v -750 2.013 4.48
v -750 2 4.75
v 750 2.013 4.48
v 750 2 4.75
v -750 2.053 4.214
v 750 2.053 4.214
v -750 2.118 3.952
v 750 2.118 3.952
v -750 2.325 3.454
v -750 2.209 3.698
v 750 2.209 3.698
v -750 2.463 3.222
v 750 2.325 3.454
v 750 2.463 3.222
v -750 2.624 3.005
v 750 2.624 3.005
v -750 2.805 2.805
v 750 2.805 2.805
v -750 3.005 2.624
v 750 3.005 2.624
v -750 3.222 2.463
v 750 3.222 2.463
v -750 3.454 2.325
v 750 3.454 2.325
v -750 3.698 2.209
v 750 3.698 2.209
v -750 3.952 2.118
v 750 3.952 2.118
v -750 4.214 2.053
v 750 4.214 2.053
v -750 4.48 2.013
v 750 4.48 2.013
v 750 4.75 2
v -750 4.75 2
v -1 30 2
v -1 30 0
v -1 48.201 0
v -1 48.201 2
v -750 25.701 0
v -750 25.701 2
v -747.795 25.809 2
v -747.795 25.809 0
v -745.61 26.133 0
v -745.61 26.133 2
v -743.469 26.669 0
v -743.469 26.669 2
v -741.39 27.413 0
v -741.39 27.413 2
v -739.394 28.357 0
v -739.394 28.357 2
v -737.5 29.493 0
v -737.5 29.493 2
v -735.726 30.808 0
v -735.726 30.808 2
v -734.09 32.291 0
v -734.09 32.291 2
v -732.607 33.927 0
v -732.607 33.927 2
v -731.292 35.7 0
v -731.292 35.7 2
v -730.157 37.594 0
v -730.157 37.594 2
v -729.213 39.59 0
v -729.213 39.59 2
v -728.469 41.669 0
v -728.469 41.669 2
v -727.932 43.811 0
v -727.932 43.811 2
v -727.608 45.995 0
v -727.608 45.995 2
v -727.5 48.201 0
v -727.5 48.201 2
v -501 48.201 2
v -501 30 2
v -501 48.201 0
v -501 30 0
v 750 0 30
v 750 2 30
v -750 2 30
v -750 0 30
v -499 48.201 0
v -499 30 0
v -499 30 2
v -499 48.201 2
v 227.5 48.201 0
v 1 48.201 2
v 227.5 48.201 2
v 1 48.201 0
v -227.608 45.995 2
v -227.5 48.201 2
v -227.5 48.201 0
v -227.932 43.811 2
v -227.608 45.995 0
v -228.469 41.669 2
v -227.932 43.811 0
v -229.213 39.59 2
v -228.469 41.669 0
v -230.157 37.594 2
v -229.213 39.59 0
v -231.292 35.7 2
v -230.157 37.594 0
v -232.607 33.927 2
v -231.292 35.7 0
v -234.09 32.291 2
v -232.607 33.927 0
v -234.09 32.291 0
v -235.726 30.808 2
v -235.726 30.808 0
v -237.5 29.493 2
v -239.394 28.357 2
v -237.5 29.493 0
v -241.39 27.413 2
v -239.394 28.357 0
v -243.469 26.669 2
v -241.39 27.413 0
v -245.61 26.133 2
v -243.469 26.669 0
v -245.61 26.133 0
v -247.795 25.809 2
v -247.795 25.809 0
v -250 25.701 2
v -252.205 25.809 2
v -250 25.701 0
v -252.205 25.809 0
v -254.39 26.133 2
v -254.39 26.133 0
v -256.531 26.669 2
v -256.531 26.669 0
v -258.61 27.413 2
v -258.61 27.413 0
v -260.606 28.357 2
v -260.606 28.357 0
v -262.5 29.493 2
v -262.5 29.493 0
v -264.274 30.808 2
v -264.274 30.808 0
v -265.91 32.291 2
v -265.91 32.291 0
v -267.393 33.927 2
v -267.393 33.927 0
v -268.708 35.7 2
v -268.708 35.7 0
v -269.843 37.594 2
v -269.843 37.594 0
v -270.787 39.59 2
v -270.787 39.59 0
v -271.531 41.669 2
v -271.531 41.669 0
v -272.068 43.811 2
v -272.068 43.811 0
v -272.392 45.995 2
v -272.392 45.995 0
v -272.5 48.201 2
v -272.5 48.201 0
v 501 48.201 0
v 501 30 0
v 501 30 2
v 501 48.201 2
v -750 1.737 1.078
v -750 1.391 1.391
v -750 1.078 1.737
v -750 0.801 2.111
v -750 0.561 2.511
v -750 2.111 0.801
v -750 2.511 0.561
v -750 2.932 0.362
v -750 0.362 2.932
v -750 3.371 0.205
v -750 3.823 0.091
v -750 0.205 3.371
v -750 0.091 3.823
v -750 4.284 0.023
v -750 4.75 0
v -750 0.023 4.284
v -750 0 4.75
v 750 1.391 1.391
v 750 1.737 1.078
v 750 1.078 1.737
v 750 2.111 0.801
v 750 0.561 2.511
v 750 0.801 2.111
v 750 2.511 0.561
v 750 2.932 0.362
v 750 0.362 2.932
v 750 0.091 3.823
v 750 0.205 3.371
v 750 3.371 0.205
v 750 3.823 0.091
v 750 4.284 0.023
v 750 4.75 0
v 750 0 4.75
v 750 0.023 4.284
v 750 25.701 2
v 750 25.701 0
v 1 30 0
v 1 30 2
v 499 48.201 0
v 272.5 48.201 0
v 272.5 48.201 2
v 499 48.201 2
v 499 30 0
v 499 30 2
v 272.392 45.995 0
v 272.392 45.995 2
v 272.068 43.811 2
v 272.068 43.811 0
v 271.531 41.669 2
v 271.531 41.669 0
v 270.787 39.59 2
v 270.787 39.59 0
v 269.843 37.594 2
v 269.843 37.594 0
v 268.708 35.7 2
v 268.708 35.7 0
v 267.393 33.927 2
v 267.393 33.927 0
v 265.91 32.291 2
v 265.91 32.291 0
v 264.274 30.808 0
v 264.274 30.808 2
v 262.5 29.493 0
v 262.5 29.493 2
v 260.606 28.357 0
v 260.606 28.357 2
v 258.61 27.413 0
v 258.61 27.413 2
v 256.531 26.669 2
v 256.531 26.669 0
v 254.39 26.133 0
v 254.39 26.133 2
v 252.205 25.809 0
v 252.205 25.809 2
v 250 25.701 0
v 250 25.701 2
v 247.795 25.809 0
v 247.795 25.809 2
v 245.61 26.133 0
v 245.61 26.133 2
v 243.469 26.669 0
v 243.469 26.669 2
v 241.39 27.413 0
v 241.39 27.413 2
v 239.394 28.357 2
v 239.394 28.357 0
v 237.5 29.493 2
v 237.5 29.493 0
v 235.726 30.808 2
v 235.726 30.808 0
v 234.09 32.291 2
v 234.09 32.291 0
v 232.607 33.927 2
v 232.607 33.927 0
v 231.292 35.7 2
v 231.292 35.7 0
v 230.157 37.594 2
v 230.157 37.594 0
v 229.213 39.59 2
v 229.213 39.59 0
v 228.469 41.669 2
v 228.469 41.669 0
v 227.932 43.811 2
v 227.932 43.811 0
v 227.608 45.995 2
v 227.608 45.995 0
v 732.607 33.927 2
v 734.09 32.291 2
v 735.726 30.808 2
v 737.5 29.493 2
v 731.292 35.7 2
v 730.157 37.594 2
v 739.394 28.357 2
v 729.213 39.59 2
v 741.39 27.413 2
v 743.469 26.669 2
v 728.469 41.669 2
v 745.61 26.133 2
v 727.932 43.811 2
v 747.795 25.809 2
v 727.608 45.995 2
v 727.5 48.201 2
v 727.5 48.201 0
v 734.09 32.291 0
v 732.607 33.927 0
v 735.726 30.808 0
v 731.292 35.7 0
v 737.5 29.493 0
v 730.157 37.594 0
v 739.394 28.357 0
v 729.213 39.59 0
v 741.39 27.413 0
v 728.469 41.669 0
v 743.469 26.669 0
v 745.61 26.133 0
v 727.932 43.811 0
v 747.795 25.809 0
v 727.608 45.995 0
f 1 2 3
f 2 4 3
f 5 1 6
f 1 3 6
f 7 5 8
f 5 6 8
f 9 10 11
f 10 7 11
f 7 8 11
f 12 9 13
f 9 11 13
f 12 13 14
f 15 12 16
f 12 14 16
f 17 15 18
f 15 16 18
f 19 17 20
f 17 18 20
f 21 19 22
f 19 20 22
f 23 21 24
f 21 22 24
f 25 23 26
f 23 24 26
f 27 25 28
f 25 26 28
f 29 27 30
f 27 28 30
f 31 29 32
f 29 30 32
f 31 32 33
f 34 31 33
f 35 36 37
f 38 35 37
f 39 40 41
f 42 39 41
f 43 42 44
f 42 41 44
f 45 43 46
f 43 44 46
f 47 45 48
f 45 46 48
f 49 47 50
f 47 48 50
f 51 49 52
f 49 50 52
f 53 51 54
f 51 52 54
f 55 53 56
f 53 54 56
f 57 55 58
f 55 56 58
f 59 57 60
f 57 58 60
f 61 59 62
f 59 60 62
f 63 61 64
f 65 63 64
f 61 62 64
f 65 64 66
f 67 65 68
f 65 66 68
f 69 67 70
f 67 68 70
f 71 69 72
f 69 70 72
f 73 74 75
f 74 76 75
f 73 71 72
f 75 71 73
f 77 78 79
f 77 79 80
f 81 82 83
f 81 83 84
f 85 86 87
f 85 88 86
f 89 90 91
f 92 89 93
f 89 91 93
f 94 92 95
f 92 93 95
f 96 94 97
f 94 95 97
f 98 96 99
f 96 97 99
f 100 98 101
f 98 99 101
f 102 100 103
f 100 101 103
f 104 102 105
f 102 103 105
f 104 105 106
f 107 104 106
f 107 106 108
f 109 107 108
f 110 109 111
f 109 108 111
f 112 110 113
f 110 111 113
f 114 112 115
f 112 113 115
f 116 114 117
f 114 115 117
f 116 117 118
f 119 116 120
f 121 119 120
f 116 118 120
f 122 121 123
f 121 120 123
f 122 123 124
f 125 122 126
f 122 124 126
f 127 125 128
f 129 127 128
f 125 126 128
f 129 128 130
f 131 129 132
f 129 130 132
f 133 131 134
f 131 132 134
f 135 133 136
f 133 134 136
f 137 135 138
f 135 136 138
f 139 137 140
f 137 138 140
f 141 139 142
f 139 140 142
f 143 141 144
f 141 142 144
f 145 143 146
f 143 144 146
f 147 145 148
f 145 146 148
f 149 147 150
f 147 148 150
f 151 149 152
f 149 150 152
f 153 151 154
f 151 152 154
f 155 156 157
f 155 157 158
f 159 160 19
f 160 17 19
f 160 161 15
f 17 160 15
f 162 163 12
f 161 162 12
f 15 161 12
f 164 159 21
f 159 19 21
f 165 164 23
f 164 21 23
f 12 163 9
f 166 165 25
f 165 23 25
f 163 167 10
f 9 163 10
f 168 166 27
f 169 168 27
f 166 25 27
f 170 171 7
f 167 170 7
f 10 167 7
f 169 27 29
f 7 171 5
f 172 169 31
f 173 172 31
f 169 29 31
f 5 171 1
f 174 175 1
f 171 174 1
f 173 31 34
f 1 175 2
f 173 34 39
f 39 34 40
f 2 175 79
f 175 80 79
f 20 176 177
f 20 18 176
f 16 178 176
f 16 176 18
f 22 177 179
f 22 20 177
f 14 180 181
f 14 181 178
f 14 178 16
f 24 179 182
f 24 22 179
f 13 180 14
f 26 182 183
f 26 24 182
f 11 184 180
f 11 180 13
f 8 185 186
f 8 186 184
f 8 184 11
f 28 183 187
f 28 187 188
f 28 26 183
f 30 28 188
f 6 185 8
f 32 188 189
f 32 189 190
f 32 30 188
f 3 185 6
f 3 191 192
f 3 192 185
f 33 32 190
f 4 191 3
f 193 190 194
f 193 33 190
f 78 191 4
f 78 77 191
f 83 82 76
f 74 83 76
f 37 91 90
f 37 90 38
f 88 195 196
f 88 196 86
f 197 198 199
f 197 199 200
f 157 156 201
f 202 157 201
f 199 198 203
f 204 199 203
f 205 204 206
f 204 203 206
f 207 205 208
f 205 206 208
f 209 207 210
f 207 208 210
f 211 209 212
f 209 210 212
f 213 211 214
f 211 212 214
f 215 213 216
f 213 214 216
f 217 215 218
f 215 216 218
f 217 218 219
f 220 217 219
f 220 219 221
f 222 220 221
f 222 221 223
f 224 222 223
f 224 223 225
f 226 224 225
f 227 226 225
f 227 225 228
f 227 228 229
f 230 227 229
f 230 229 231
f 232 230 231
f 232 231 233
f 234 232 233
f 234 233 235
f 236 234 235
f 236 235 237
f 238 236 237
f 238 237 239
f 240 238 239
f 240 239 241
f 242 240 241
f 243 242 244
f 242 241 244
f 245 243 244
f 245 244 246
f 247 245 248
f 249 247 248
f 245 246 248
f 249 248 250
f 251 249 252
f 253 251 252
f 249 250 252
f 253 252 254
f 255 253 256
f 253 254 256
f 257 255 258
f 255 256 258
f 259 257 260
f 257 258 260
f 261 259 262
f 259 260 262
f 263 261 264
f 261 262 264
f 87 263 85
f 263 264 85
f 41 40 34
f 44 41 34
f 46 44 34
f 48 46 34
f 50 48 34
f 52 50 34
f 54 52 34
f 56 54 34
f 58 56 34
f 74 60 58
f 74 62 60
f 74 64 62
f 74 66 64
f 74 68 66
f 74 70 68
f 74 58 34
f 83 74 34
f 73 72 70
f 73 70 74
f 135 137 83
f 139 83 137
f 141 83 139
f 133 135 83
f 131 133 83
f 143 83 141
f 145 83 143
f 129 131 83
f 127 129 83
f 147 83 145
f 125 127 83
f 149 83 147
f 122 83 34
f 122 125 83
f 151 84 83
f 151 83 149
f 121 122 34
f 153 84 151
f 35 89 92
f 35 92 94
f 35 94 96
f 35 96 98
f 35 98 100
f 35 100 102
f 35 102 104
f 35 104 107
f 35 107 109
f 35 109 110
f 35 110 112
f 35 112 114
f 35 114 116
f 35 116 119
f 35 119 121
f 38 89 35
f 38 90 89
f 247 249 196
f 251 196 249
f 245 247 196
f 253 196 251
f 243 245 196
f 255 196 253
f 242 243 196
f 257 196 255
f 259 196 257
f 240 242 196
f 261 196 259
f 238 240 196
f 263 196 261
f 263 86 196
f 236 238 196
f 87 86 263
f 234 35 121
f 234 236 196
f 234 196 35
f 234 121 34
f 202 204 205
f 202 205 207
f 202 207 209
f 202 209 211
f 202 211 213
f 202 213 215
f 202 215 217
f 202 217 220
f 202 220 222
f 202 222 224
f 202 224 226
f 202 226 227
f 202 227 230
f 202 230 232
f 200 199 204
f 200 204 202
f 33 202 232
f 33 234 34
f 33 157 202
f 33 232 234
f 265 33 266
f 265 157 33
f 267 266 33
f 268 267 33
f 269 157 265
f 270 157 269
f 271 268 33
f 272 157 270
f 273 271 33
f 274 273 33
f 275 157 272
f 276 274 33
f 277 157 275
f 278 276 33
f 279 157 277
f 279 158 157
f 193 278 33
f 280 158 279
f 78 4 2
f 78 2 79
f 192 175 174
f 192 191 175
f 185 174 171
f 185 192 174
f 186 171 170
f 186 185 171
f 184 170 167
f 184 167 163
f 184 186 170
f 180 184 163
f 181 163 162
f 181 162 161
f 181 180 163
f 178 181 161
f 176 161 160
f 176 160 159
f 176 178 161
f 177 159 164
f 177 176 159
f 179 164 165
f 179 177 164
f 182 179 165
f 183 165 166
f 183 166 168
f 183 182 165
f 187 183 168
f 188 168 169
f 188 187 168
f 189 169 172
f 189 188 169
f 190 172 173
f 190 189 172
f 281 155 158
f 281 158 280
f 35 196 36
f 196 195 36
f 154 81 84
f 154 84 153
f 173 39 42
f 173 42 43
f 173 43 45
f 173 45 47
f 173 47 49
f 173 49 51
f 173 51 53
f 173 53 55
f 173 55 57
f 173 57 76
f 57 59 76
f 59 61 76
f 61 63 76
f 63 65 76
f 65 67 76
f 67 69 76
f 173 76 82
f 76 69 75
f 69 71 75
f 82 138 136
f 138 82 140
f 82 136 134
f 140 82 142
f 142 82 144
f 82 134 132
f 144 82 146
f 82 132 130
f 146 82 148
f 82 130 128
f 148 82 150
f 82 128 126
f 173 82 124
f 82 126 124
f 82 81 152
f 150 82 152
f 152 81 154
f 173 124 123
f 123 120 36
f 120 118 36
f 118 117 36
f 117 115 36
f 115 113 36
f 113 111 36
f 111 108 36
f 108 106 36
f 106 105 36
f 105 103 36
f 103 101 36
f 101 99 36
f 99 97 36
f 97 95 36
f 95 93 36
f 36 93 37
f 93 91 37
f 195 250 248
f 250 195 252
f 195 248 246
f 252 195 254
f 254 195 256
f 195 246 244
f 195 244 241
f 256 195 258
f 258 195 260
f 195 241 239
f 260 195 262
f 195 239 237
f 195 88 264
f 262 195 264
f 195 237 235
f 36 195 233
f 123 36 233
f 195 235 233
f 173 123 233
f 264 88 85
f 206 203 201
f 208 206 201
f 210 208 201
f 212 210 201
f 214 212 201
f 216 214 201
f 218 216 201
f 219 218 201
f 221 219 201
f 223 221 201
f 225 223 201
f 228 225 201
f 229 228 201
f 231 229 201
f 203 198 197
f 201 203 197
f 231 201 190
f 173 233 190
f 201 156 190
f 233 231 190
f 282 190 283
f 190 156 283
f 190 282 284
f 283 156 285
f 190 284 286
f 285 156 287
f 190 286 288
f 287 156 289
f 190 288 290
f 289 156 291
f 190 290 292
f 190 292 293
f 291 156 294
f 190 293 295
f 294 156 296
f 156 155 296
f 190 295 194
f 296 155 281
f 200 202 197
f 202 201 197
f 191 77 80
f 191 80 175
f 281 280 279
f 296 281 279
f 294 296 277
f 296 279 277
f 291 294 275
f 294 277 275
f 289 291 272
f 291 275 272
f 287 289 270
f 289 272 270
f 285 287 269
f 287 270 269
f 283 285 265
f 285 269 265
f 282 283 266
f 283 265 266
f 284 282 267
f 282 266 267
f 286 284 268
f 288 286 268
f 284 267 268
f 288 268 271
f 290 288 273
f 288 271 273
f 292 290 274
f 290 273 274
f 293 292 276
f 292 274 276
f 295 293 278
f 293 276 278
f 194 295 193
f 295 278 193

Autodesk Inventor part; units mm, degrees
ref_plane "YZ Plane" through (0, 0, 0) normal (1, 0, 0) x (0, 1, 0)
ref_plane "XZ Plane" through (0, 0, 0) normal (0, 1, 0) x (-1, 0, 0)
ref_plane "XY Plane" through (0, 0, 0) normal (0, 0, 1) x (1, 0, 0)
sketch "Sketch1" plane through (0, 0, 0) normal (0, 0, 1) x (1, 0, 0)
  line L0 (-750, 48.2006) -> (750, 48.2006)
  line L1 (750, 48.2006) -> (750, 0)
  line L2 (750, 0) -> (-750, 0)
  line L3 (-750, 0) -> (-750, 48.2006)
  point P0 (0, 0)
  point P1 (0, 0)
  dimension "d0" = 1500
  dimension "d1" = 48.2006
extrude "Plate1" add sketch "Sketch1" along normal blind 2
sketch "Sketch2" plane through (750, 2, 0) normal (0, -1, 0) x (1, 0, 0)
  line L0 (-1500, 0) -> (0, 0)
  line L1 (0, 0) -> (0, 30)
  line L2 (0, 30) -> (-1500, 30)
  line L3 (-1500, 30) -> (-1500, 0)
edge flange "Flange1" height 30 angle 90 thickness 2 bend radius 2.75 thickness toward (0, -1, 0) relief round relief width 2 relief depth 1 edges at (0, 0, 2) wall of the first edge with corners at (-750, 2, 0) (750, 2, 0) (750, 2, 30) (-750, 2, 30)
bend "Bend1"
corner "Corner1"
sketch "Sketch5" plane through (0, 0, 0) normal (0, 0, -1) x (-1, 0, 0)
  line L0 (750, 48.2006) -> (-750, 48.2006) projected
  line L1 (-1, 30) -> (-1, 48.2006)
  line L2 (750, 0) -> (-750, 0) projected
  line L3 (-1, 30) -> (1, 30)
  line L4 (1, 30) -> (1, 48.2006)
  point P0 (0, 0)
  point P1 (0, 30)
  point P2 (0, 0)
  dimension "d27" = 2
  dimension "d28" = 30
extrude "Extrusion1" cut sketch "Sketch5" against normal through all
pattern_linear "Rectangular Pattern1" count 3 spacing 500 along (1, 0, 0) of "Extrusion1" first direction both ways yes
sketch "Sketch6" plane through (0, 0, 0) normal (0, 0, -1) x (-1, 0, 0)
  line L0 (-750, 48.2006) -> (-750, 4.75) projected
  circle A0 centre (-750, 48.2006) radius 22.5
  line L1 (-750, 48.2006) -> (750, 48.2006) projected
  line L2 (-1, 48.2006) -> (-1, 30) projected
  line L3 (-499, 48.2006) -> (-499, 30) projected
  line L4 (-1, 30) -> (-499, 30) construction
  circle A1 centre (-250, 48.2006) radius 22.5
  point P0 (0, 0)
  point P1 (-727.5, 48.2006)
  point P2 (-750, 25.7006)
  point P3 (-250, 30)
  dimension "d24" = 45
extrude "Extrusion2" cut sketch "Sketch6" along normal mid plane 30 contours L1 A0 L0 | A1 L1 | L1 A1 picked at (-748.3311, 33.3886)
mirror "Mirror1" about plane through (0, 0, 0) normal (1, 0, 0) of "Extrusion2"
sketch "Sketch7" plane through (0, 0, 2) normal (0, 0, 1) x (1, 0, 0)
  arc A0 (-750, 25.7006) -> (-727.5, 48.2006) centre (-750, 48.2006) ccw projected
  line L0 (-750, 4.75) -> (-750, 25.7006) projected
  line L1 (-750, 4.75) -> (750, 4.75) projected
  line L2 (750, 25.7006) -> (750, 4.75) projected
  arc A1 (727.5, 48.2006) -> (750, 25.7006) centre (750, 48.2006) ccw projected
  line L3 (501, 48.2006) -> (727.5, 48.2006) projected
  line L4 (501, 48.2006) -> (501, 30) projected
  line L5 (501, 30) -> (499, 30) projected
  line L6 (499, 30) -> (499, 48.2006) projected
  line L7 (1, 48.2006) -> (227.5, 48.2006) projected
  line L8 (1, 48.2006) -> (1, 30) projected
  line L9 (1, 30) -> (-1, 30) projected
  line L10 (-1, 30) -> (-1, 48.2006) projected
  line L11 (-499, 48.2006) -> (-272.5, 48.2006) projected
  line L12 (-499, 48.2006) -> (-499, 30) projected
  line L13 (-499, 30) -> (-501, 30) projected
  line L14 (-501, 30) -> (-501, 48.2006) projected
  line L15 (-727.5, 48.2006) -> (-501, 48.2006) projected
  line L16 (650, 4.75) -> (650, 48.2006) construction
  line L17 (-750, 4.75) -> (750, 4.75) projected
  circle A2 centre (650, 26.4753) radius 5
  circle A3 centre (630, 26.4753) radius 5
  line L18 (272.5, 48.2006) -> (499, 48.2006) projected
  arc A4 (227.5, 48.2006) -> (272.5, 48.2006) centre (250, 48.2006) ccw projected
  line L19 (-227.5, 48.2006) -> (-1, 48.2006) projected
  arc A5 (-272.5, 48.2006) -> (-227.5, 48.2006) centre (-250, 48.2006) ccw projected
  point P0 (0, 0)
  dimension "d29" = 100
  dimension "d30" = 10
  dimension "d31" = 10
  dimension "d32" = 20
extrude "Extrusion3" [suppressed]
mirror "Mirror2" [suppressed]
sketch "Sketch8" plane through (0, 0, 2) normal (0, 0, 1) x (1, 0, 0)
  line L0 (494, 43.2006) -> (494, 31.2006) construction
  line L1 (494, 31.2006) -> (294, 31.2006) construction
  line L2 (294, 31.2006) -> (294, 43.2006) construction
  line L3 (294, 43.2006) -> (494, 43.2006) construction
  line L4 (501, 48.2006) -> (727.5, 48.2006) projected
  line L5 (272.5, 48.2006) -> (499, 48.2006) projected
  point P0 (0, 0)
  dimension "d35" = 200
  dimension "d36" = 12
  dimension "d39" = 5
  dimension "d40" = 5
mark "Mark1"
equation "\"d28\" = Стрингер_глубина_паза"
equation "\"d1\" = Стрингер_4"
equation "\"d27\" = d18"
equation "\"d2\" = Thickness"
equation "\"d3\" = BendReliefWidth"
equation "\"d4\" = BendReliefDepth"
equation "\"d5\" = MinimumRemnant"
equation "\"d6\" = TransitionRadius"
equation "\"d9\" = BendRadius"
equation "\"d10\" = CornerReliefSize"
equation "\"d11\" = GapSize"
equation "\"d12\" = JacobiRadiusSize"
equation "\"BendReliefWidth\" = Thickness"
equation "\"BendReliefDepth\" = 0.5 * Thickness"
equation "\"CornerReliefSize\" = 4 * Thickness"
equation "\"MinimumRemnant\" = 2 * Thickness"
equation "\"TransitionRadius\" = BendRadius"
equation "\"JacobiRadiusSize\" = BendRadius"
equation "\"GapSize\" = Thickness"
equation "\"d18\" = Thickness"
equation "\"Стрингер_4\" = 48.200594"
equation "\"Thickness\" = 2"
equation "\"BendRadius\" = 2.75"
equation "\"Стрингер_глубина_паза\" = 30"
properties part number "MSC 064 stringer board ##" material "Stainless Steel"
